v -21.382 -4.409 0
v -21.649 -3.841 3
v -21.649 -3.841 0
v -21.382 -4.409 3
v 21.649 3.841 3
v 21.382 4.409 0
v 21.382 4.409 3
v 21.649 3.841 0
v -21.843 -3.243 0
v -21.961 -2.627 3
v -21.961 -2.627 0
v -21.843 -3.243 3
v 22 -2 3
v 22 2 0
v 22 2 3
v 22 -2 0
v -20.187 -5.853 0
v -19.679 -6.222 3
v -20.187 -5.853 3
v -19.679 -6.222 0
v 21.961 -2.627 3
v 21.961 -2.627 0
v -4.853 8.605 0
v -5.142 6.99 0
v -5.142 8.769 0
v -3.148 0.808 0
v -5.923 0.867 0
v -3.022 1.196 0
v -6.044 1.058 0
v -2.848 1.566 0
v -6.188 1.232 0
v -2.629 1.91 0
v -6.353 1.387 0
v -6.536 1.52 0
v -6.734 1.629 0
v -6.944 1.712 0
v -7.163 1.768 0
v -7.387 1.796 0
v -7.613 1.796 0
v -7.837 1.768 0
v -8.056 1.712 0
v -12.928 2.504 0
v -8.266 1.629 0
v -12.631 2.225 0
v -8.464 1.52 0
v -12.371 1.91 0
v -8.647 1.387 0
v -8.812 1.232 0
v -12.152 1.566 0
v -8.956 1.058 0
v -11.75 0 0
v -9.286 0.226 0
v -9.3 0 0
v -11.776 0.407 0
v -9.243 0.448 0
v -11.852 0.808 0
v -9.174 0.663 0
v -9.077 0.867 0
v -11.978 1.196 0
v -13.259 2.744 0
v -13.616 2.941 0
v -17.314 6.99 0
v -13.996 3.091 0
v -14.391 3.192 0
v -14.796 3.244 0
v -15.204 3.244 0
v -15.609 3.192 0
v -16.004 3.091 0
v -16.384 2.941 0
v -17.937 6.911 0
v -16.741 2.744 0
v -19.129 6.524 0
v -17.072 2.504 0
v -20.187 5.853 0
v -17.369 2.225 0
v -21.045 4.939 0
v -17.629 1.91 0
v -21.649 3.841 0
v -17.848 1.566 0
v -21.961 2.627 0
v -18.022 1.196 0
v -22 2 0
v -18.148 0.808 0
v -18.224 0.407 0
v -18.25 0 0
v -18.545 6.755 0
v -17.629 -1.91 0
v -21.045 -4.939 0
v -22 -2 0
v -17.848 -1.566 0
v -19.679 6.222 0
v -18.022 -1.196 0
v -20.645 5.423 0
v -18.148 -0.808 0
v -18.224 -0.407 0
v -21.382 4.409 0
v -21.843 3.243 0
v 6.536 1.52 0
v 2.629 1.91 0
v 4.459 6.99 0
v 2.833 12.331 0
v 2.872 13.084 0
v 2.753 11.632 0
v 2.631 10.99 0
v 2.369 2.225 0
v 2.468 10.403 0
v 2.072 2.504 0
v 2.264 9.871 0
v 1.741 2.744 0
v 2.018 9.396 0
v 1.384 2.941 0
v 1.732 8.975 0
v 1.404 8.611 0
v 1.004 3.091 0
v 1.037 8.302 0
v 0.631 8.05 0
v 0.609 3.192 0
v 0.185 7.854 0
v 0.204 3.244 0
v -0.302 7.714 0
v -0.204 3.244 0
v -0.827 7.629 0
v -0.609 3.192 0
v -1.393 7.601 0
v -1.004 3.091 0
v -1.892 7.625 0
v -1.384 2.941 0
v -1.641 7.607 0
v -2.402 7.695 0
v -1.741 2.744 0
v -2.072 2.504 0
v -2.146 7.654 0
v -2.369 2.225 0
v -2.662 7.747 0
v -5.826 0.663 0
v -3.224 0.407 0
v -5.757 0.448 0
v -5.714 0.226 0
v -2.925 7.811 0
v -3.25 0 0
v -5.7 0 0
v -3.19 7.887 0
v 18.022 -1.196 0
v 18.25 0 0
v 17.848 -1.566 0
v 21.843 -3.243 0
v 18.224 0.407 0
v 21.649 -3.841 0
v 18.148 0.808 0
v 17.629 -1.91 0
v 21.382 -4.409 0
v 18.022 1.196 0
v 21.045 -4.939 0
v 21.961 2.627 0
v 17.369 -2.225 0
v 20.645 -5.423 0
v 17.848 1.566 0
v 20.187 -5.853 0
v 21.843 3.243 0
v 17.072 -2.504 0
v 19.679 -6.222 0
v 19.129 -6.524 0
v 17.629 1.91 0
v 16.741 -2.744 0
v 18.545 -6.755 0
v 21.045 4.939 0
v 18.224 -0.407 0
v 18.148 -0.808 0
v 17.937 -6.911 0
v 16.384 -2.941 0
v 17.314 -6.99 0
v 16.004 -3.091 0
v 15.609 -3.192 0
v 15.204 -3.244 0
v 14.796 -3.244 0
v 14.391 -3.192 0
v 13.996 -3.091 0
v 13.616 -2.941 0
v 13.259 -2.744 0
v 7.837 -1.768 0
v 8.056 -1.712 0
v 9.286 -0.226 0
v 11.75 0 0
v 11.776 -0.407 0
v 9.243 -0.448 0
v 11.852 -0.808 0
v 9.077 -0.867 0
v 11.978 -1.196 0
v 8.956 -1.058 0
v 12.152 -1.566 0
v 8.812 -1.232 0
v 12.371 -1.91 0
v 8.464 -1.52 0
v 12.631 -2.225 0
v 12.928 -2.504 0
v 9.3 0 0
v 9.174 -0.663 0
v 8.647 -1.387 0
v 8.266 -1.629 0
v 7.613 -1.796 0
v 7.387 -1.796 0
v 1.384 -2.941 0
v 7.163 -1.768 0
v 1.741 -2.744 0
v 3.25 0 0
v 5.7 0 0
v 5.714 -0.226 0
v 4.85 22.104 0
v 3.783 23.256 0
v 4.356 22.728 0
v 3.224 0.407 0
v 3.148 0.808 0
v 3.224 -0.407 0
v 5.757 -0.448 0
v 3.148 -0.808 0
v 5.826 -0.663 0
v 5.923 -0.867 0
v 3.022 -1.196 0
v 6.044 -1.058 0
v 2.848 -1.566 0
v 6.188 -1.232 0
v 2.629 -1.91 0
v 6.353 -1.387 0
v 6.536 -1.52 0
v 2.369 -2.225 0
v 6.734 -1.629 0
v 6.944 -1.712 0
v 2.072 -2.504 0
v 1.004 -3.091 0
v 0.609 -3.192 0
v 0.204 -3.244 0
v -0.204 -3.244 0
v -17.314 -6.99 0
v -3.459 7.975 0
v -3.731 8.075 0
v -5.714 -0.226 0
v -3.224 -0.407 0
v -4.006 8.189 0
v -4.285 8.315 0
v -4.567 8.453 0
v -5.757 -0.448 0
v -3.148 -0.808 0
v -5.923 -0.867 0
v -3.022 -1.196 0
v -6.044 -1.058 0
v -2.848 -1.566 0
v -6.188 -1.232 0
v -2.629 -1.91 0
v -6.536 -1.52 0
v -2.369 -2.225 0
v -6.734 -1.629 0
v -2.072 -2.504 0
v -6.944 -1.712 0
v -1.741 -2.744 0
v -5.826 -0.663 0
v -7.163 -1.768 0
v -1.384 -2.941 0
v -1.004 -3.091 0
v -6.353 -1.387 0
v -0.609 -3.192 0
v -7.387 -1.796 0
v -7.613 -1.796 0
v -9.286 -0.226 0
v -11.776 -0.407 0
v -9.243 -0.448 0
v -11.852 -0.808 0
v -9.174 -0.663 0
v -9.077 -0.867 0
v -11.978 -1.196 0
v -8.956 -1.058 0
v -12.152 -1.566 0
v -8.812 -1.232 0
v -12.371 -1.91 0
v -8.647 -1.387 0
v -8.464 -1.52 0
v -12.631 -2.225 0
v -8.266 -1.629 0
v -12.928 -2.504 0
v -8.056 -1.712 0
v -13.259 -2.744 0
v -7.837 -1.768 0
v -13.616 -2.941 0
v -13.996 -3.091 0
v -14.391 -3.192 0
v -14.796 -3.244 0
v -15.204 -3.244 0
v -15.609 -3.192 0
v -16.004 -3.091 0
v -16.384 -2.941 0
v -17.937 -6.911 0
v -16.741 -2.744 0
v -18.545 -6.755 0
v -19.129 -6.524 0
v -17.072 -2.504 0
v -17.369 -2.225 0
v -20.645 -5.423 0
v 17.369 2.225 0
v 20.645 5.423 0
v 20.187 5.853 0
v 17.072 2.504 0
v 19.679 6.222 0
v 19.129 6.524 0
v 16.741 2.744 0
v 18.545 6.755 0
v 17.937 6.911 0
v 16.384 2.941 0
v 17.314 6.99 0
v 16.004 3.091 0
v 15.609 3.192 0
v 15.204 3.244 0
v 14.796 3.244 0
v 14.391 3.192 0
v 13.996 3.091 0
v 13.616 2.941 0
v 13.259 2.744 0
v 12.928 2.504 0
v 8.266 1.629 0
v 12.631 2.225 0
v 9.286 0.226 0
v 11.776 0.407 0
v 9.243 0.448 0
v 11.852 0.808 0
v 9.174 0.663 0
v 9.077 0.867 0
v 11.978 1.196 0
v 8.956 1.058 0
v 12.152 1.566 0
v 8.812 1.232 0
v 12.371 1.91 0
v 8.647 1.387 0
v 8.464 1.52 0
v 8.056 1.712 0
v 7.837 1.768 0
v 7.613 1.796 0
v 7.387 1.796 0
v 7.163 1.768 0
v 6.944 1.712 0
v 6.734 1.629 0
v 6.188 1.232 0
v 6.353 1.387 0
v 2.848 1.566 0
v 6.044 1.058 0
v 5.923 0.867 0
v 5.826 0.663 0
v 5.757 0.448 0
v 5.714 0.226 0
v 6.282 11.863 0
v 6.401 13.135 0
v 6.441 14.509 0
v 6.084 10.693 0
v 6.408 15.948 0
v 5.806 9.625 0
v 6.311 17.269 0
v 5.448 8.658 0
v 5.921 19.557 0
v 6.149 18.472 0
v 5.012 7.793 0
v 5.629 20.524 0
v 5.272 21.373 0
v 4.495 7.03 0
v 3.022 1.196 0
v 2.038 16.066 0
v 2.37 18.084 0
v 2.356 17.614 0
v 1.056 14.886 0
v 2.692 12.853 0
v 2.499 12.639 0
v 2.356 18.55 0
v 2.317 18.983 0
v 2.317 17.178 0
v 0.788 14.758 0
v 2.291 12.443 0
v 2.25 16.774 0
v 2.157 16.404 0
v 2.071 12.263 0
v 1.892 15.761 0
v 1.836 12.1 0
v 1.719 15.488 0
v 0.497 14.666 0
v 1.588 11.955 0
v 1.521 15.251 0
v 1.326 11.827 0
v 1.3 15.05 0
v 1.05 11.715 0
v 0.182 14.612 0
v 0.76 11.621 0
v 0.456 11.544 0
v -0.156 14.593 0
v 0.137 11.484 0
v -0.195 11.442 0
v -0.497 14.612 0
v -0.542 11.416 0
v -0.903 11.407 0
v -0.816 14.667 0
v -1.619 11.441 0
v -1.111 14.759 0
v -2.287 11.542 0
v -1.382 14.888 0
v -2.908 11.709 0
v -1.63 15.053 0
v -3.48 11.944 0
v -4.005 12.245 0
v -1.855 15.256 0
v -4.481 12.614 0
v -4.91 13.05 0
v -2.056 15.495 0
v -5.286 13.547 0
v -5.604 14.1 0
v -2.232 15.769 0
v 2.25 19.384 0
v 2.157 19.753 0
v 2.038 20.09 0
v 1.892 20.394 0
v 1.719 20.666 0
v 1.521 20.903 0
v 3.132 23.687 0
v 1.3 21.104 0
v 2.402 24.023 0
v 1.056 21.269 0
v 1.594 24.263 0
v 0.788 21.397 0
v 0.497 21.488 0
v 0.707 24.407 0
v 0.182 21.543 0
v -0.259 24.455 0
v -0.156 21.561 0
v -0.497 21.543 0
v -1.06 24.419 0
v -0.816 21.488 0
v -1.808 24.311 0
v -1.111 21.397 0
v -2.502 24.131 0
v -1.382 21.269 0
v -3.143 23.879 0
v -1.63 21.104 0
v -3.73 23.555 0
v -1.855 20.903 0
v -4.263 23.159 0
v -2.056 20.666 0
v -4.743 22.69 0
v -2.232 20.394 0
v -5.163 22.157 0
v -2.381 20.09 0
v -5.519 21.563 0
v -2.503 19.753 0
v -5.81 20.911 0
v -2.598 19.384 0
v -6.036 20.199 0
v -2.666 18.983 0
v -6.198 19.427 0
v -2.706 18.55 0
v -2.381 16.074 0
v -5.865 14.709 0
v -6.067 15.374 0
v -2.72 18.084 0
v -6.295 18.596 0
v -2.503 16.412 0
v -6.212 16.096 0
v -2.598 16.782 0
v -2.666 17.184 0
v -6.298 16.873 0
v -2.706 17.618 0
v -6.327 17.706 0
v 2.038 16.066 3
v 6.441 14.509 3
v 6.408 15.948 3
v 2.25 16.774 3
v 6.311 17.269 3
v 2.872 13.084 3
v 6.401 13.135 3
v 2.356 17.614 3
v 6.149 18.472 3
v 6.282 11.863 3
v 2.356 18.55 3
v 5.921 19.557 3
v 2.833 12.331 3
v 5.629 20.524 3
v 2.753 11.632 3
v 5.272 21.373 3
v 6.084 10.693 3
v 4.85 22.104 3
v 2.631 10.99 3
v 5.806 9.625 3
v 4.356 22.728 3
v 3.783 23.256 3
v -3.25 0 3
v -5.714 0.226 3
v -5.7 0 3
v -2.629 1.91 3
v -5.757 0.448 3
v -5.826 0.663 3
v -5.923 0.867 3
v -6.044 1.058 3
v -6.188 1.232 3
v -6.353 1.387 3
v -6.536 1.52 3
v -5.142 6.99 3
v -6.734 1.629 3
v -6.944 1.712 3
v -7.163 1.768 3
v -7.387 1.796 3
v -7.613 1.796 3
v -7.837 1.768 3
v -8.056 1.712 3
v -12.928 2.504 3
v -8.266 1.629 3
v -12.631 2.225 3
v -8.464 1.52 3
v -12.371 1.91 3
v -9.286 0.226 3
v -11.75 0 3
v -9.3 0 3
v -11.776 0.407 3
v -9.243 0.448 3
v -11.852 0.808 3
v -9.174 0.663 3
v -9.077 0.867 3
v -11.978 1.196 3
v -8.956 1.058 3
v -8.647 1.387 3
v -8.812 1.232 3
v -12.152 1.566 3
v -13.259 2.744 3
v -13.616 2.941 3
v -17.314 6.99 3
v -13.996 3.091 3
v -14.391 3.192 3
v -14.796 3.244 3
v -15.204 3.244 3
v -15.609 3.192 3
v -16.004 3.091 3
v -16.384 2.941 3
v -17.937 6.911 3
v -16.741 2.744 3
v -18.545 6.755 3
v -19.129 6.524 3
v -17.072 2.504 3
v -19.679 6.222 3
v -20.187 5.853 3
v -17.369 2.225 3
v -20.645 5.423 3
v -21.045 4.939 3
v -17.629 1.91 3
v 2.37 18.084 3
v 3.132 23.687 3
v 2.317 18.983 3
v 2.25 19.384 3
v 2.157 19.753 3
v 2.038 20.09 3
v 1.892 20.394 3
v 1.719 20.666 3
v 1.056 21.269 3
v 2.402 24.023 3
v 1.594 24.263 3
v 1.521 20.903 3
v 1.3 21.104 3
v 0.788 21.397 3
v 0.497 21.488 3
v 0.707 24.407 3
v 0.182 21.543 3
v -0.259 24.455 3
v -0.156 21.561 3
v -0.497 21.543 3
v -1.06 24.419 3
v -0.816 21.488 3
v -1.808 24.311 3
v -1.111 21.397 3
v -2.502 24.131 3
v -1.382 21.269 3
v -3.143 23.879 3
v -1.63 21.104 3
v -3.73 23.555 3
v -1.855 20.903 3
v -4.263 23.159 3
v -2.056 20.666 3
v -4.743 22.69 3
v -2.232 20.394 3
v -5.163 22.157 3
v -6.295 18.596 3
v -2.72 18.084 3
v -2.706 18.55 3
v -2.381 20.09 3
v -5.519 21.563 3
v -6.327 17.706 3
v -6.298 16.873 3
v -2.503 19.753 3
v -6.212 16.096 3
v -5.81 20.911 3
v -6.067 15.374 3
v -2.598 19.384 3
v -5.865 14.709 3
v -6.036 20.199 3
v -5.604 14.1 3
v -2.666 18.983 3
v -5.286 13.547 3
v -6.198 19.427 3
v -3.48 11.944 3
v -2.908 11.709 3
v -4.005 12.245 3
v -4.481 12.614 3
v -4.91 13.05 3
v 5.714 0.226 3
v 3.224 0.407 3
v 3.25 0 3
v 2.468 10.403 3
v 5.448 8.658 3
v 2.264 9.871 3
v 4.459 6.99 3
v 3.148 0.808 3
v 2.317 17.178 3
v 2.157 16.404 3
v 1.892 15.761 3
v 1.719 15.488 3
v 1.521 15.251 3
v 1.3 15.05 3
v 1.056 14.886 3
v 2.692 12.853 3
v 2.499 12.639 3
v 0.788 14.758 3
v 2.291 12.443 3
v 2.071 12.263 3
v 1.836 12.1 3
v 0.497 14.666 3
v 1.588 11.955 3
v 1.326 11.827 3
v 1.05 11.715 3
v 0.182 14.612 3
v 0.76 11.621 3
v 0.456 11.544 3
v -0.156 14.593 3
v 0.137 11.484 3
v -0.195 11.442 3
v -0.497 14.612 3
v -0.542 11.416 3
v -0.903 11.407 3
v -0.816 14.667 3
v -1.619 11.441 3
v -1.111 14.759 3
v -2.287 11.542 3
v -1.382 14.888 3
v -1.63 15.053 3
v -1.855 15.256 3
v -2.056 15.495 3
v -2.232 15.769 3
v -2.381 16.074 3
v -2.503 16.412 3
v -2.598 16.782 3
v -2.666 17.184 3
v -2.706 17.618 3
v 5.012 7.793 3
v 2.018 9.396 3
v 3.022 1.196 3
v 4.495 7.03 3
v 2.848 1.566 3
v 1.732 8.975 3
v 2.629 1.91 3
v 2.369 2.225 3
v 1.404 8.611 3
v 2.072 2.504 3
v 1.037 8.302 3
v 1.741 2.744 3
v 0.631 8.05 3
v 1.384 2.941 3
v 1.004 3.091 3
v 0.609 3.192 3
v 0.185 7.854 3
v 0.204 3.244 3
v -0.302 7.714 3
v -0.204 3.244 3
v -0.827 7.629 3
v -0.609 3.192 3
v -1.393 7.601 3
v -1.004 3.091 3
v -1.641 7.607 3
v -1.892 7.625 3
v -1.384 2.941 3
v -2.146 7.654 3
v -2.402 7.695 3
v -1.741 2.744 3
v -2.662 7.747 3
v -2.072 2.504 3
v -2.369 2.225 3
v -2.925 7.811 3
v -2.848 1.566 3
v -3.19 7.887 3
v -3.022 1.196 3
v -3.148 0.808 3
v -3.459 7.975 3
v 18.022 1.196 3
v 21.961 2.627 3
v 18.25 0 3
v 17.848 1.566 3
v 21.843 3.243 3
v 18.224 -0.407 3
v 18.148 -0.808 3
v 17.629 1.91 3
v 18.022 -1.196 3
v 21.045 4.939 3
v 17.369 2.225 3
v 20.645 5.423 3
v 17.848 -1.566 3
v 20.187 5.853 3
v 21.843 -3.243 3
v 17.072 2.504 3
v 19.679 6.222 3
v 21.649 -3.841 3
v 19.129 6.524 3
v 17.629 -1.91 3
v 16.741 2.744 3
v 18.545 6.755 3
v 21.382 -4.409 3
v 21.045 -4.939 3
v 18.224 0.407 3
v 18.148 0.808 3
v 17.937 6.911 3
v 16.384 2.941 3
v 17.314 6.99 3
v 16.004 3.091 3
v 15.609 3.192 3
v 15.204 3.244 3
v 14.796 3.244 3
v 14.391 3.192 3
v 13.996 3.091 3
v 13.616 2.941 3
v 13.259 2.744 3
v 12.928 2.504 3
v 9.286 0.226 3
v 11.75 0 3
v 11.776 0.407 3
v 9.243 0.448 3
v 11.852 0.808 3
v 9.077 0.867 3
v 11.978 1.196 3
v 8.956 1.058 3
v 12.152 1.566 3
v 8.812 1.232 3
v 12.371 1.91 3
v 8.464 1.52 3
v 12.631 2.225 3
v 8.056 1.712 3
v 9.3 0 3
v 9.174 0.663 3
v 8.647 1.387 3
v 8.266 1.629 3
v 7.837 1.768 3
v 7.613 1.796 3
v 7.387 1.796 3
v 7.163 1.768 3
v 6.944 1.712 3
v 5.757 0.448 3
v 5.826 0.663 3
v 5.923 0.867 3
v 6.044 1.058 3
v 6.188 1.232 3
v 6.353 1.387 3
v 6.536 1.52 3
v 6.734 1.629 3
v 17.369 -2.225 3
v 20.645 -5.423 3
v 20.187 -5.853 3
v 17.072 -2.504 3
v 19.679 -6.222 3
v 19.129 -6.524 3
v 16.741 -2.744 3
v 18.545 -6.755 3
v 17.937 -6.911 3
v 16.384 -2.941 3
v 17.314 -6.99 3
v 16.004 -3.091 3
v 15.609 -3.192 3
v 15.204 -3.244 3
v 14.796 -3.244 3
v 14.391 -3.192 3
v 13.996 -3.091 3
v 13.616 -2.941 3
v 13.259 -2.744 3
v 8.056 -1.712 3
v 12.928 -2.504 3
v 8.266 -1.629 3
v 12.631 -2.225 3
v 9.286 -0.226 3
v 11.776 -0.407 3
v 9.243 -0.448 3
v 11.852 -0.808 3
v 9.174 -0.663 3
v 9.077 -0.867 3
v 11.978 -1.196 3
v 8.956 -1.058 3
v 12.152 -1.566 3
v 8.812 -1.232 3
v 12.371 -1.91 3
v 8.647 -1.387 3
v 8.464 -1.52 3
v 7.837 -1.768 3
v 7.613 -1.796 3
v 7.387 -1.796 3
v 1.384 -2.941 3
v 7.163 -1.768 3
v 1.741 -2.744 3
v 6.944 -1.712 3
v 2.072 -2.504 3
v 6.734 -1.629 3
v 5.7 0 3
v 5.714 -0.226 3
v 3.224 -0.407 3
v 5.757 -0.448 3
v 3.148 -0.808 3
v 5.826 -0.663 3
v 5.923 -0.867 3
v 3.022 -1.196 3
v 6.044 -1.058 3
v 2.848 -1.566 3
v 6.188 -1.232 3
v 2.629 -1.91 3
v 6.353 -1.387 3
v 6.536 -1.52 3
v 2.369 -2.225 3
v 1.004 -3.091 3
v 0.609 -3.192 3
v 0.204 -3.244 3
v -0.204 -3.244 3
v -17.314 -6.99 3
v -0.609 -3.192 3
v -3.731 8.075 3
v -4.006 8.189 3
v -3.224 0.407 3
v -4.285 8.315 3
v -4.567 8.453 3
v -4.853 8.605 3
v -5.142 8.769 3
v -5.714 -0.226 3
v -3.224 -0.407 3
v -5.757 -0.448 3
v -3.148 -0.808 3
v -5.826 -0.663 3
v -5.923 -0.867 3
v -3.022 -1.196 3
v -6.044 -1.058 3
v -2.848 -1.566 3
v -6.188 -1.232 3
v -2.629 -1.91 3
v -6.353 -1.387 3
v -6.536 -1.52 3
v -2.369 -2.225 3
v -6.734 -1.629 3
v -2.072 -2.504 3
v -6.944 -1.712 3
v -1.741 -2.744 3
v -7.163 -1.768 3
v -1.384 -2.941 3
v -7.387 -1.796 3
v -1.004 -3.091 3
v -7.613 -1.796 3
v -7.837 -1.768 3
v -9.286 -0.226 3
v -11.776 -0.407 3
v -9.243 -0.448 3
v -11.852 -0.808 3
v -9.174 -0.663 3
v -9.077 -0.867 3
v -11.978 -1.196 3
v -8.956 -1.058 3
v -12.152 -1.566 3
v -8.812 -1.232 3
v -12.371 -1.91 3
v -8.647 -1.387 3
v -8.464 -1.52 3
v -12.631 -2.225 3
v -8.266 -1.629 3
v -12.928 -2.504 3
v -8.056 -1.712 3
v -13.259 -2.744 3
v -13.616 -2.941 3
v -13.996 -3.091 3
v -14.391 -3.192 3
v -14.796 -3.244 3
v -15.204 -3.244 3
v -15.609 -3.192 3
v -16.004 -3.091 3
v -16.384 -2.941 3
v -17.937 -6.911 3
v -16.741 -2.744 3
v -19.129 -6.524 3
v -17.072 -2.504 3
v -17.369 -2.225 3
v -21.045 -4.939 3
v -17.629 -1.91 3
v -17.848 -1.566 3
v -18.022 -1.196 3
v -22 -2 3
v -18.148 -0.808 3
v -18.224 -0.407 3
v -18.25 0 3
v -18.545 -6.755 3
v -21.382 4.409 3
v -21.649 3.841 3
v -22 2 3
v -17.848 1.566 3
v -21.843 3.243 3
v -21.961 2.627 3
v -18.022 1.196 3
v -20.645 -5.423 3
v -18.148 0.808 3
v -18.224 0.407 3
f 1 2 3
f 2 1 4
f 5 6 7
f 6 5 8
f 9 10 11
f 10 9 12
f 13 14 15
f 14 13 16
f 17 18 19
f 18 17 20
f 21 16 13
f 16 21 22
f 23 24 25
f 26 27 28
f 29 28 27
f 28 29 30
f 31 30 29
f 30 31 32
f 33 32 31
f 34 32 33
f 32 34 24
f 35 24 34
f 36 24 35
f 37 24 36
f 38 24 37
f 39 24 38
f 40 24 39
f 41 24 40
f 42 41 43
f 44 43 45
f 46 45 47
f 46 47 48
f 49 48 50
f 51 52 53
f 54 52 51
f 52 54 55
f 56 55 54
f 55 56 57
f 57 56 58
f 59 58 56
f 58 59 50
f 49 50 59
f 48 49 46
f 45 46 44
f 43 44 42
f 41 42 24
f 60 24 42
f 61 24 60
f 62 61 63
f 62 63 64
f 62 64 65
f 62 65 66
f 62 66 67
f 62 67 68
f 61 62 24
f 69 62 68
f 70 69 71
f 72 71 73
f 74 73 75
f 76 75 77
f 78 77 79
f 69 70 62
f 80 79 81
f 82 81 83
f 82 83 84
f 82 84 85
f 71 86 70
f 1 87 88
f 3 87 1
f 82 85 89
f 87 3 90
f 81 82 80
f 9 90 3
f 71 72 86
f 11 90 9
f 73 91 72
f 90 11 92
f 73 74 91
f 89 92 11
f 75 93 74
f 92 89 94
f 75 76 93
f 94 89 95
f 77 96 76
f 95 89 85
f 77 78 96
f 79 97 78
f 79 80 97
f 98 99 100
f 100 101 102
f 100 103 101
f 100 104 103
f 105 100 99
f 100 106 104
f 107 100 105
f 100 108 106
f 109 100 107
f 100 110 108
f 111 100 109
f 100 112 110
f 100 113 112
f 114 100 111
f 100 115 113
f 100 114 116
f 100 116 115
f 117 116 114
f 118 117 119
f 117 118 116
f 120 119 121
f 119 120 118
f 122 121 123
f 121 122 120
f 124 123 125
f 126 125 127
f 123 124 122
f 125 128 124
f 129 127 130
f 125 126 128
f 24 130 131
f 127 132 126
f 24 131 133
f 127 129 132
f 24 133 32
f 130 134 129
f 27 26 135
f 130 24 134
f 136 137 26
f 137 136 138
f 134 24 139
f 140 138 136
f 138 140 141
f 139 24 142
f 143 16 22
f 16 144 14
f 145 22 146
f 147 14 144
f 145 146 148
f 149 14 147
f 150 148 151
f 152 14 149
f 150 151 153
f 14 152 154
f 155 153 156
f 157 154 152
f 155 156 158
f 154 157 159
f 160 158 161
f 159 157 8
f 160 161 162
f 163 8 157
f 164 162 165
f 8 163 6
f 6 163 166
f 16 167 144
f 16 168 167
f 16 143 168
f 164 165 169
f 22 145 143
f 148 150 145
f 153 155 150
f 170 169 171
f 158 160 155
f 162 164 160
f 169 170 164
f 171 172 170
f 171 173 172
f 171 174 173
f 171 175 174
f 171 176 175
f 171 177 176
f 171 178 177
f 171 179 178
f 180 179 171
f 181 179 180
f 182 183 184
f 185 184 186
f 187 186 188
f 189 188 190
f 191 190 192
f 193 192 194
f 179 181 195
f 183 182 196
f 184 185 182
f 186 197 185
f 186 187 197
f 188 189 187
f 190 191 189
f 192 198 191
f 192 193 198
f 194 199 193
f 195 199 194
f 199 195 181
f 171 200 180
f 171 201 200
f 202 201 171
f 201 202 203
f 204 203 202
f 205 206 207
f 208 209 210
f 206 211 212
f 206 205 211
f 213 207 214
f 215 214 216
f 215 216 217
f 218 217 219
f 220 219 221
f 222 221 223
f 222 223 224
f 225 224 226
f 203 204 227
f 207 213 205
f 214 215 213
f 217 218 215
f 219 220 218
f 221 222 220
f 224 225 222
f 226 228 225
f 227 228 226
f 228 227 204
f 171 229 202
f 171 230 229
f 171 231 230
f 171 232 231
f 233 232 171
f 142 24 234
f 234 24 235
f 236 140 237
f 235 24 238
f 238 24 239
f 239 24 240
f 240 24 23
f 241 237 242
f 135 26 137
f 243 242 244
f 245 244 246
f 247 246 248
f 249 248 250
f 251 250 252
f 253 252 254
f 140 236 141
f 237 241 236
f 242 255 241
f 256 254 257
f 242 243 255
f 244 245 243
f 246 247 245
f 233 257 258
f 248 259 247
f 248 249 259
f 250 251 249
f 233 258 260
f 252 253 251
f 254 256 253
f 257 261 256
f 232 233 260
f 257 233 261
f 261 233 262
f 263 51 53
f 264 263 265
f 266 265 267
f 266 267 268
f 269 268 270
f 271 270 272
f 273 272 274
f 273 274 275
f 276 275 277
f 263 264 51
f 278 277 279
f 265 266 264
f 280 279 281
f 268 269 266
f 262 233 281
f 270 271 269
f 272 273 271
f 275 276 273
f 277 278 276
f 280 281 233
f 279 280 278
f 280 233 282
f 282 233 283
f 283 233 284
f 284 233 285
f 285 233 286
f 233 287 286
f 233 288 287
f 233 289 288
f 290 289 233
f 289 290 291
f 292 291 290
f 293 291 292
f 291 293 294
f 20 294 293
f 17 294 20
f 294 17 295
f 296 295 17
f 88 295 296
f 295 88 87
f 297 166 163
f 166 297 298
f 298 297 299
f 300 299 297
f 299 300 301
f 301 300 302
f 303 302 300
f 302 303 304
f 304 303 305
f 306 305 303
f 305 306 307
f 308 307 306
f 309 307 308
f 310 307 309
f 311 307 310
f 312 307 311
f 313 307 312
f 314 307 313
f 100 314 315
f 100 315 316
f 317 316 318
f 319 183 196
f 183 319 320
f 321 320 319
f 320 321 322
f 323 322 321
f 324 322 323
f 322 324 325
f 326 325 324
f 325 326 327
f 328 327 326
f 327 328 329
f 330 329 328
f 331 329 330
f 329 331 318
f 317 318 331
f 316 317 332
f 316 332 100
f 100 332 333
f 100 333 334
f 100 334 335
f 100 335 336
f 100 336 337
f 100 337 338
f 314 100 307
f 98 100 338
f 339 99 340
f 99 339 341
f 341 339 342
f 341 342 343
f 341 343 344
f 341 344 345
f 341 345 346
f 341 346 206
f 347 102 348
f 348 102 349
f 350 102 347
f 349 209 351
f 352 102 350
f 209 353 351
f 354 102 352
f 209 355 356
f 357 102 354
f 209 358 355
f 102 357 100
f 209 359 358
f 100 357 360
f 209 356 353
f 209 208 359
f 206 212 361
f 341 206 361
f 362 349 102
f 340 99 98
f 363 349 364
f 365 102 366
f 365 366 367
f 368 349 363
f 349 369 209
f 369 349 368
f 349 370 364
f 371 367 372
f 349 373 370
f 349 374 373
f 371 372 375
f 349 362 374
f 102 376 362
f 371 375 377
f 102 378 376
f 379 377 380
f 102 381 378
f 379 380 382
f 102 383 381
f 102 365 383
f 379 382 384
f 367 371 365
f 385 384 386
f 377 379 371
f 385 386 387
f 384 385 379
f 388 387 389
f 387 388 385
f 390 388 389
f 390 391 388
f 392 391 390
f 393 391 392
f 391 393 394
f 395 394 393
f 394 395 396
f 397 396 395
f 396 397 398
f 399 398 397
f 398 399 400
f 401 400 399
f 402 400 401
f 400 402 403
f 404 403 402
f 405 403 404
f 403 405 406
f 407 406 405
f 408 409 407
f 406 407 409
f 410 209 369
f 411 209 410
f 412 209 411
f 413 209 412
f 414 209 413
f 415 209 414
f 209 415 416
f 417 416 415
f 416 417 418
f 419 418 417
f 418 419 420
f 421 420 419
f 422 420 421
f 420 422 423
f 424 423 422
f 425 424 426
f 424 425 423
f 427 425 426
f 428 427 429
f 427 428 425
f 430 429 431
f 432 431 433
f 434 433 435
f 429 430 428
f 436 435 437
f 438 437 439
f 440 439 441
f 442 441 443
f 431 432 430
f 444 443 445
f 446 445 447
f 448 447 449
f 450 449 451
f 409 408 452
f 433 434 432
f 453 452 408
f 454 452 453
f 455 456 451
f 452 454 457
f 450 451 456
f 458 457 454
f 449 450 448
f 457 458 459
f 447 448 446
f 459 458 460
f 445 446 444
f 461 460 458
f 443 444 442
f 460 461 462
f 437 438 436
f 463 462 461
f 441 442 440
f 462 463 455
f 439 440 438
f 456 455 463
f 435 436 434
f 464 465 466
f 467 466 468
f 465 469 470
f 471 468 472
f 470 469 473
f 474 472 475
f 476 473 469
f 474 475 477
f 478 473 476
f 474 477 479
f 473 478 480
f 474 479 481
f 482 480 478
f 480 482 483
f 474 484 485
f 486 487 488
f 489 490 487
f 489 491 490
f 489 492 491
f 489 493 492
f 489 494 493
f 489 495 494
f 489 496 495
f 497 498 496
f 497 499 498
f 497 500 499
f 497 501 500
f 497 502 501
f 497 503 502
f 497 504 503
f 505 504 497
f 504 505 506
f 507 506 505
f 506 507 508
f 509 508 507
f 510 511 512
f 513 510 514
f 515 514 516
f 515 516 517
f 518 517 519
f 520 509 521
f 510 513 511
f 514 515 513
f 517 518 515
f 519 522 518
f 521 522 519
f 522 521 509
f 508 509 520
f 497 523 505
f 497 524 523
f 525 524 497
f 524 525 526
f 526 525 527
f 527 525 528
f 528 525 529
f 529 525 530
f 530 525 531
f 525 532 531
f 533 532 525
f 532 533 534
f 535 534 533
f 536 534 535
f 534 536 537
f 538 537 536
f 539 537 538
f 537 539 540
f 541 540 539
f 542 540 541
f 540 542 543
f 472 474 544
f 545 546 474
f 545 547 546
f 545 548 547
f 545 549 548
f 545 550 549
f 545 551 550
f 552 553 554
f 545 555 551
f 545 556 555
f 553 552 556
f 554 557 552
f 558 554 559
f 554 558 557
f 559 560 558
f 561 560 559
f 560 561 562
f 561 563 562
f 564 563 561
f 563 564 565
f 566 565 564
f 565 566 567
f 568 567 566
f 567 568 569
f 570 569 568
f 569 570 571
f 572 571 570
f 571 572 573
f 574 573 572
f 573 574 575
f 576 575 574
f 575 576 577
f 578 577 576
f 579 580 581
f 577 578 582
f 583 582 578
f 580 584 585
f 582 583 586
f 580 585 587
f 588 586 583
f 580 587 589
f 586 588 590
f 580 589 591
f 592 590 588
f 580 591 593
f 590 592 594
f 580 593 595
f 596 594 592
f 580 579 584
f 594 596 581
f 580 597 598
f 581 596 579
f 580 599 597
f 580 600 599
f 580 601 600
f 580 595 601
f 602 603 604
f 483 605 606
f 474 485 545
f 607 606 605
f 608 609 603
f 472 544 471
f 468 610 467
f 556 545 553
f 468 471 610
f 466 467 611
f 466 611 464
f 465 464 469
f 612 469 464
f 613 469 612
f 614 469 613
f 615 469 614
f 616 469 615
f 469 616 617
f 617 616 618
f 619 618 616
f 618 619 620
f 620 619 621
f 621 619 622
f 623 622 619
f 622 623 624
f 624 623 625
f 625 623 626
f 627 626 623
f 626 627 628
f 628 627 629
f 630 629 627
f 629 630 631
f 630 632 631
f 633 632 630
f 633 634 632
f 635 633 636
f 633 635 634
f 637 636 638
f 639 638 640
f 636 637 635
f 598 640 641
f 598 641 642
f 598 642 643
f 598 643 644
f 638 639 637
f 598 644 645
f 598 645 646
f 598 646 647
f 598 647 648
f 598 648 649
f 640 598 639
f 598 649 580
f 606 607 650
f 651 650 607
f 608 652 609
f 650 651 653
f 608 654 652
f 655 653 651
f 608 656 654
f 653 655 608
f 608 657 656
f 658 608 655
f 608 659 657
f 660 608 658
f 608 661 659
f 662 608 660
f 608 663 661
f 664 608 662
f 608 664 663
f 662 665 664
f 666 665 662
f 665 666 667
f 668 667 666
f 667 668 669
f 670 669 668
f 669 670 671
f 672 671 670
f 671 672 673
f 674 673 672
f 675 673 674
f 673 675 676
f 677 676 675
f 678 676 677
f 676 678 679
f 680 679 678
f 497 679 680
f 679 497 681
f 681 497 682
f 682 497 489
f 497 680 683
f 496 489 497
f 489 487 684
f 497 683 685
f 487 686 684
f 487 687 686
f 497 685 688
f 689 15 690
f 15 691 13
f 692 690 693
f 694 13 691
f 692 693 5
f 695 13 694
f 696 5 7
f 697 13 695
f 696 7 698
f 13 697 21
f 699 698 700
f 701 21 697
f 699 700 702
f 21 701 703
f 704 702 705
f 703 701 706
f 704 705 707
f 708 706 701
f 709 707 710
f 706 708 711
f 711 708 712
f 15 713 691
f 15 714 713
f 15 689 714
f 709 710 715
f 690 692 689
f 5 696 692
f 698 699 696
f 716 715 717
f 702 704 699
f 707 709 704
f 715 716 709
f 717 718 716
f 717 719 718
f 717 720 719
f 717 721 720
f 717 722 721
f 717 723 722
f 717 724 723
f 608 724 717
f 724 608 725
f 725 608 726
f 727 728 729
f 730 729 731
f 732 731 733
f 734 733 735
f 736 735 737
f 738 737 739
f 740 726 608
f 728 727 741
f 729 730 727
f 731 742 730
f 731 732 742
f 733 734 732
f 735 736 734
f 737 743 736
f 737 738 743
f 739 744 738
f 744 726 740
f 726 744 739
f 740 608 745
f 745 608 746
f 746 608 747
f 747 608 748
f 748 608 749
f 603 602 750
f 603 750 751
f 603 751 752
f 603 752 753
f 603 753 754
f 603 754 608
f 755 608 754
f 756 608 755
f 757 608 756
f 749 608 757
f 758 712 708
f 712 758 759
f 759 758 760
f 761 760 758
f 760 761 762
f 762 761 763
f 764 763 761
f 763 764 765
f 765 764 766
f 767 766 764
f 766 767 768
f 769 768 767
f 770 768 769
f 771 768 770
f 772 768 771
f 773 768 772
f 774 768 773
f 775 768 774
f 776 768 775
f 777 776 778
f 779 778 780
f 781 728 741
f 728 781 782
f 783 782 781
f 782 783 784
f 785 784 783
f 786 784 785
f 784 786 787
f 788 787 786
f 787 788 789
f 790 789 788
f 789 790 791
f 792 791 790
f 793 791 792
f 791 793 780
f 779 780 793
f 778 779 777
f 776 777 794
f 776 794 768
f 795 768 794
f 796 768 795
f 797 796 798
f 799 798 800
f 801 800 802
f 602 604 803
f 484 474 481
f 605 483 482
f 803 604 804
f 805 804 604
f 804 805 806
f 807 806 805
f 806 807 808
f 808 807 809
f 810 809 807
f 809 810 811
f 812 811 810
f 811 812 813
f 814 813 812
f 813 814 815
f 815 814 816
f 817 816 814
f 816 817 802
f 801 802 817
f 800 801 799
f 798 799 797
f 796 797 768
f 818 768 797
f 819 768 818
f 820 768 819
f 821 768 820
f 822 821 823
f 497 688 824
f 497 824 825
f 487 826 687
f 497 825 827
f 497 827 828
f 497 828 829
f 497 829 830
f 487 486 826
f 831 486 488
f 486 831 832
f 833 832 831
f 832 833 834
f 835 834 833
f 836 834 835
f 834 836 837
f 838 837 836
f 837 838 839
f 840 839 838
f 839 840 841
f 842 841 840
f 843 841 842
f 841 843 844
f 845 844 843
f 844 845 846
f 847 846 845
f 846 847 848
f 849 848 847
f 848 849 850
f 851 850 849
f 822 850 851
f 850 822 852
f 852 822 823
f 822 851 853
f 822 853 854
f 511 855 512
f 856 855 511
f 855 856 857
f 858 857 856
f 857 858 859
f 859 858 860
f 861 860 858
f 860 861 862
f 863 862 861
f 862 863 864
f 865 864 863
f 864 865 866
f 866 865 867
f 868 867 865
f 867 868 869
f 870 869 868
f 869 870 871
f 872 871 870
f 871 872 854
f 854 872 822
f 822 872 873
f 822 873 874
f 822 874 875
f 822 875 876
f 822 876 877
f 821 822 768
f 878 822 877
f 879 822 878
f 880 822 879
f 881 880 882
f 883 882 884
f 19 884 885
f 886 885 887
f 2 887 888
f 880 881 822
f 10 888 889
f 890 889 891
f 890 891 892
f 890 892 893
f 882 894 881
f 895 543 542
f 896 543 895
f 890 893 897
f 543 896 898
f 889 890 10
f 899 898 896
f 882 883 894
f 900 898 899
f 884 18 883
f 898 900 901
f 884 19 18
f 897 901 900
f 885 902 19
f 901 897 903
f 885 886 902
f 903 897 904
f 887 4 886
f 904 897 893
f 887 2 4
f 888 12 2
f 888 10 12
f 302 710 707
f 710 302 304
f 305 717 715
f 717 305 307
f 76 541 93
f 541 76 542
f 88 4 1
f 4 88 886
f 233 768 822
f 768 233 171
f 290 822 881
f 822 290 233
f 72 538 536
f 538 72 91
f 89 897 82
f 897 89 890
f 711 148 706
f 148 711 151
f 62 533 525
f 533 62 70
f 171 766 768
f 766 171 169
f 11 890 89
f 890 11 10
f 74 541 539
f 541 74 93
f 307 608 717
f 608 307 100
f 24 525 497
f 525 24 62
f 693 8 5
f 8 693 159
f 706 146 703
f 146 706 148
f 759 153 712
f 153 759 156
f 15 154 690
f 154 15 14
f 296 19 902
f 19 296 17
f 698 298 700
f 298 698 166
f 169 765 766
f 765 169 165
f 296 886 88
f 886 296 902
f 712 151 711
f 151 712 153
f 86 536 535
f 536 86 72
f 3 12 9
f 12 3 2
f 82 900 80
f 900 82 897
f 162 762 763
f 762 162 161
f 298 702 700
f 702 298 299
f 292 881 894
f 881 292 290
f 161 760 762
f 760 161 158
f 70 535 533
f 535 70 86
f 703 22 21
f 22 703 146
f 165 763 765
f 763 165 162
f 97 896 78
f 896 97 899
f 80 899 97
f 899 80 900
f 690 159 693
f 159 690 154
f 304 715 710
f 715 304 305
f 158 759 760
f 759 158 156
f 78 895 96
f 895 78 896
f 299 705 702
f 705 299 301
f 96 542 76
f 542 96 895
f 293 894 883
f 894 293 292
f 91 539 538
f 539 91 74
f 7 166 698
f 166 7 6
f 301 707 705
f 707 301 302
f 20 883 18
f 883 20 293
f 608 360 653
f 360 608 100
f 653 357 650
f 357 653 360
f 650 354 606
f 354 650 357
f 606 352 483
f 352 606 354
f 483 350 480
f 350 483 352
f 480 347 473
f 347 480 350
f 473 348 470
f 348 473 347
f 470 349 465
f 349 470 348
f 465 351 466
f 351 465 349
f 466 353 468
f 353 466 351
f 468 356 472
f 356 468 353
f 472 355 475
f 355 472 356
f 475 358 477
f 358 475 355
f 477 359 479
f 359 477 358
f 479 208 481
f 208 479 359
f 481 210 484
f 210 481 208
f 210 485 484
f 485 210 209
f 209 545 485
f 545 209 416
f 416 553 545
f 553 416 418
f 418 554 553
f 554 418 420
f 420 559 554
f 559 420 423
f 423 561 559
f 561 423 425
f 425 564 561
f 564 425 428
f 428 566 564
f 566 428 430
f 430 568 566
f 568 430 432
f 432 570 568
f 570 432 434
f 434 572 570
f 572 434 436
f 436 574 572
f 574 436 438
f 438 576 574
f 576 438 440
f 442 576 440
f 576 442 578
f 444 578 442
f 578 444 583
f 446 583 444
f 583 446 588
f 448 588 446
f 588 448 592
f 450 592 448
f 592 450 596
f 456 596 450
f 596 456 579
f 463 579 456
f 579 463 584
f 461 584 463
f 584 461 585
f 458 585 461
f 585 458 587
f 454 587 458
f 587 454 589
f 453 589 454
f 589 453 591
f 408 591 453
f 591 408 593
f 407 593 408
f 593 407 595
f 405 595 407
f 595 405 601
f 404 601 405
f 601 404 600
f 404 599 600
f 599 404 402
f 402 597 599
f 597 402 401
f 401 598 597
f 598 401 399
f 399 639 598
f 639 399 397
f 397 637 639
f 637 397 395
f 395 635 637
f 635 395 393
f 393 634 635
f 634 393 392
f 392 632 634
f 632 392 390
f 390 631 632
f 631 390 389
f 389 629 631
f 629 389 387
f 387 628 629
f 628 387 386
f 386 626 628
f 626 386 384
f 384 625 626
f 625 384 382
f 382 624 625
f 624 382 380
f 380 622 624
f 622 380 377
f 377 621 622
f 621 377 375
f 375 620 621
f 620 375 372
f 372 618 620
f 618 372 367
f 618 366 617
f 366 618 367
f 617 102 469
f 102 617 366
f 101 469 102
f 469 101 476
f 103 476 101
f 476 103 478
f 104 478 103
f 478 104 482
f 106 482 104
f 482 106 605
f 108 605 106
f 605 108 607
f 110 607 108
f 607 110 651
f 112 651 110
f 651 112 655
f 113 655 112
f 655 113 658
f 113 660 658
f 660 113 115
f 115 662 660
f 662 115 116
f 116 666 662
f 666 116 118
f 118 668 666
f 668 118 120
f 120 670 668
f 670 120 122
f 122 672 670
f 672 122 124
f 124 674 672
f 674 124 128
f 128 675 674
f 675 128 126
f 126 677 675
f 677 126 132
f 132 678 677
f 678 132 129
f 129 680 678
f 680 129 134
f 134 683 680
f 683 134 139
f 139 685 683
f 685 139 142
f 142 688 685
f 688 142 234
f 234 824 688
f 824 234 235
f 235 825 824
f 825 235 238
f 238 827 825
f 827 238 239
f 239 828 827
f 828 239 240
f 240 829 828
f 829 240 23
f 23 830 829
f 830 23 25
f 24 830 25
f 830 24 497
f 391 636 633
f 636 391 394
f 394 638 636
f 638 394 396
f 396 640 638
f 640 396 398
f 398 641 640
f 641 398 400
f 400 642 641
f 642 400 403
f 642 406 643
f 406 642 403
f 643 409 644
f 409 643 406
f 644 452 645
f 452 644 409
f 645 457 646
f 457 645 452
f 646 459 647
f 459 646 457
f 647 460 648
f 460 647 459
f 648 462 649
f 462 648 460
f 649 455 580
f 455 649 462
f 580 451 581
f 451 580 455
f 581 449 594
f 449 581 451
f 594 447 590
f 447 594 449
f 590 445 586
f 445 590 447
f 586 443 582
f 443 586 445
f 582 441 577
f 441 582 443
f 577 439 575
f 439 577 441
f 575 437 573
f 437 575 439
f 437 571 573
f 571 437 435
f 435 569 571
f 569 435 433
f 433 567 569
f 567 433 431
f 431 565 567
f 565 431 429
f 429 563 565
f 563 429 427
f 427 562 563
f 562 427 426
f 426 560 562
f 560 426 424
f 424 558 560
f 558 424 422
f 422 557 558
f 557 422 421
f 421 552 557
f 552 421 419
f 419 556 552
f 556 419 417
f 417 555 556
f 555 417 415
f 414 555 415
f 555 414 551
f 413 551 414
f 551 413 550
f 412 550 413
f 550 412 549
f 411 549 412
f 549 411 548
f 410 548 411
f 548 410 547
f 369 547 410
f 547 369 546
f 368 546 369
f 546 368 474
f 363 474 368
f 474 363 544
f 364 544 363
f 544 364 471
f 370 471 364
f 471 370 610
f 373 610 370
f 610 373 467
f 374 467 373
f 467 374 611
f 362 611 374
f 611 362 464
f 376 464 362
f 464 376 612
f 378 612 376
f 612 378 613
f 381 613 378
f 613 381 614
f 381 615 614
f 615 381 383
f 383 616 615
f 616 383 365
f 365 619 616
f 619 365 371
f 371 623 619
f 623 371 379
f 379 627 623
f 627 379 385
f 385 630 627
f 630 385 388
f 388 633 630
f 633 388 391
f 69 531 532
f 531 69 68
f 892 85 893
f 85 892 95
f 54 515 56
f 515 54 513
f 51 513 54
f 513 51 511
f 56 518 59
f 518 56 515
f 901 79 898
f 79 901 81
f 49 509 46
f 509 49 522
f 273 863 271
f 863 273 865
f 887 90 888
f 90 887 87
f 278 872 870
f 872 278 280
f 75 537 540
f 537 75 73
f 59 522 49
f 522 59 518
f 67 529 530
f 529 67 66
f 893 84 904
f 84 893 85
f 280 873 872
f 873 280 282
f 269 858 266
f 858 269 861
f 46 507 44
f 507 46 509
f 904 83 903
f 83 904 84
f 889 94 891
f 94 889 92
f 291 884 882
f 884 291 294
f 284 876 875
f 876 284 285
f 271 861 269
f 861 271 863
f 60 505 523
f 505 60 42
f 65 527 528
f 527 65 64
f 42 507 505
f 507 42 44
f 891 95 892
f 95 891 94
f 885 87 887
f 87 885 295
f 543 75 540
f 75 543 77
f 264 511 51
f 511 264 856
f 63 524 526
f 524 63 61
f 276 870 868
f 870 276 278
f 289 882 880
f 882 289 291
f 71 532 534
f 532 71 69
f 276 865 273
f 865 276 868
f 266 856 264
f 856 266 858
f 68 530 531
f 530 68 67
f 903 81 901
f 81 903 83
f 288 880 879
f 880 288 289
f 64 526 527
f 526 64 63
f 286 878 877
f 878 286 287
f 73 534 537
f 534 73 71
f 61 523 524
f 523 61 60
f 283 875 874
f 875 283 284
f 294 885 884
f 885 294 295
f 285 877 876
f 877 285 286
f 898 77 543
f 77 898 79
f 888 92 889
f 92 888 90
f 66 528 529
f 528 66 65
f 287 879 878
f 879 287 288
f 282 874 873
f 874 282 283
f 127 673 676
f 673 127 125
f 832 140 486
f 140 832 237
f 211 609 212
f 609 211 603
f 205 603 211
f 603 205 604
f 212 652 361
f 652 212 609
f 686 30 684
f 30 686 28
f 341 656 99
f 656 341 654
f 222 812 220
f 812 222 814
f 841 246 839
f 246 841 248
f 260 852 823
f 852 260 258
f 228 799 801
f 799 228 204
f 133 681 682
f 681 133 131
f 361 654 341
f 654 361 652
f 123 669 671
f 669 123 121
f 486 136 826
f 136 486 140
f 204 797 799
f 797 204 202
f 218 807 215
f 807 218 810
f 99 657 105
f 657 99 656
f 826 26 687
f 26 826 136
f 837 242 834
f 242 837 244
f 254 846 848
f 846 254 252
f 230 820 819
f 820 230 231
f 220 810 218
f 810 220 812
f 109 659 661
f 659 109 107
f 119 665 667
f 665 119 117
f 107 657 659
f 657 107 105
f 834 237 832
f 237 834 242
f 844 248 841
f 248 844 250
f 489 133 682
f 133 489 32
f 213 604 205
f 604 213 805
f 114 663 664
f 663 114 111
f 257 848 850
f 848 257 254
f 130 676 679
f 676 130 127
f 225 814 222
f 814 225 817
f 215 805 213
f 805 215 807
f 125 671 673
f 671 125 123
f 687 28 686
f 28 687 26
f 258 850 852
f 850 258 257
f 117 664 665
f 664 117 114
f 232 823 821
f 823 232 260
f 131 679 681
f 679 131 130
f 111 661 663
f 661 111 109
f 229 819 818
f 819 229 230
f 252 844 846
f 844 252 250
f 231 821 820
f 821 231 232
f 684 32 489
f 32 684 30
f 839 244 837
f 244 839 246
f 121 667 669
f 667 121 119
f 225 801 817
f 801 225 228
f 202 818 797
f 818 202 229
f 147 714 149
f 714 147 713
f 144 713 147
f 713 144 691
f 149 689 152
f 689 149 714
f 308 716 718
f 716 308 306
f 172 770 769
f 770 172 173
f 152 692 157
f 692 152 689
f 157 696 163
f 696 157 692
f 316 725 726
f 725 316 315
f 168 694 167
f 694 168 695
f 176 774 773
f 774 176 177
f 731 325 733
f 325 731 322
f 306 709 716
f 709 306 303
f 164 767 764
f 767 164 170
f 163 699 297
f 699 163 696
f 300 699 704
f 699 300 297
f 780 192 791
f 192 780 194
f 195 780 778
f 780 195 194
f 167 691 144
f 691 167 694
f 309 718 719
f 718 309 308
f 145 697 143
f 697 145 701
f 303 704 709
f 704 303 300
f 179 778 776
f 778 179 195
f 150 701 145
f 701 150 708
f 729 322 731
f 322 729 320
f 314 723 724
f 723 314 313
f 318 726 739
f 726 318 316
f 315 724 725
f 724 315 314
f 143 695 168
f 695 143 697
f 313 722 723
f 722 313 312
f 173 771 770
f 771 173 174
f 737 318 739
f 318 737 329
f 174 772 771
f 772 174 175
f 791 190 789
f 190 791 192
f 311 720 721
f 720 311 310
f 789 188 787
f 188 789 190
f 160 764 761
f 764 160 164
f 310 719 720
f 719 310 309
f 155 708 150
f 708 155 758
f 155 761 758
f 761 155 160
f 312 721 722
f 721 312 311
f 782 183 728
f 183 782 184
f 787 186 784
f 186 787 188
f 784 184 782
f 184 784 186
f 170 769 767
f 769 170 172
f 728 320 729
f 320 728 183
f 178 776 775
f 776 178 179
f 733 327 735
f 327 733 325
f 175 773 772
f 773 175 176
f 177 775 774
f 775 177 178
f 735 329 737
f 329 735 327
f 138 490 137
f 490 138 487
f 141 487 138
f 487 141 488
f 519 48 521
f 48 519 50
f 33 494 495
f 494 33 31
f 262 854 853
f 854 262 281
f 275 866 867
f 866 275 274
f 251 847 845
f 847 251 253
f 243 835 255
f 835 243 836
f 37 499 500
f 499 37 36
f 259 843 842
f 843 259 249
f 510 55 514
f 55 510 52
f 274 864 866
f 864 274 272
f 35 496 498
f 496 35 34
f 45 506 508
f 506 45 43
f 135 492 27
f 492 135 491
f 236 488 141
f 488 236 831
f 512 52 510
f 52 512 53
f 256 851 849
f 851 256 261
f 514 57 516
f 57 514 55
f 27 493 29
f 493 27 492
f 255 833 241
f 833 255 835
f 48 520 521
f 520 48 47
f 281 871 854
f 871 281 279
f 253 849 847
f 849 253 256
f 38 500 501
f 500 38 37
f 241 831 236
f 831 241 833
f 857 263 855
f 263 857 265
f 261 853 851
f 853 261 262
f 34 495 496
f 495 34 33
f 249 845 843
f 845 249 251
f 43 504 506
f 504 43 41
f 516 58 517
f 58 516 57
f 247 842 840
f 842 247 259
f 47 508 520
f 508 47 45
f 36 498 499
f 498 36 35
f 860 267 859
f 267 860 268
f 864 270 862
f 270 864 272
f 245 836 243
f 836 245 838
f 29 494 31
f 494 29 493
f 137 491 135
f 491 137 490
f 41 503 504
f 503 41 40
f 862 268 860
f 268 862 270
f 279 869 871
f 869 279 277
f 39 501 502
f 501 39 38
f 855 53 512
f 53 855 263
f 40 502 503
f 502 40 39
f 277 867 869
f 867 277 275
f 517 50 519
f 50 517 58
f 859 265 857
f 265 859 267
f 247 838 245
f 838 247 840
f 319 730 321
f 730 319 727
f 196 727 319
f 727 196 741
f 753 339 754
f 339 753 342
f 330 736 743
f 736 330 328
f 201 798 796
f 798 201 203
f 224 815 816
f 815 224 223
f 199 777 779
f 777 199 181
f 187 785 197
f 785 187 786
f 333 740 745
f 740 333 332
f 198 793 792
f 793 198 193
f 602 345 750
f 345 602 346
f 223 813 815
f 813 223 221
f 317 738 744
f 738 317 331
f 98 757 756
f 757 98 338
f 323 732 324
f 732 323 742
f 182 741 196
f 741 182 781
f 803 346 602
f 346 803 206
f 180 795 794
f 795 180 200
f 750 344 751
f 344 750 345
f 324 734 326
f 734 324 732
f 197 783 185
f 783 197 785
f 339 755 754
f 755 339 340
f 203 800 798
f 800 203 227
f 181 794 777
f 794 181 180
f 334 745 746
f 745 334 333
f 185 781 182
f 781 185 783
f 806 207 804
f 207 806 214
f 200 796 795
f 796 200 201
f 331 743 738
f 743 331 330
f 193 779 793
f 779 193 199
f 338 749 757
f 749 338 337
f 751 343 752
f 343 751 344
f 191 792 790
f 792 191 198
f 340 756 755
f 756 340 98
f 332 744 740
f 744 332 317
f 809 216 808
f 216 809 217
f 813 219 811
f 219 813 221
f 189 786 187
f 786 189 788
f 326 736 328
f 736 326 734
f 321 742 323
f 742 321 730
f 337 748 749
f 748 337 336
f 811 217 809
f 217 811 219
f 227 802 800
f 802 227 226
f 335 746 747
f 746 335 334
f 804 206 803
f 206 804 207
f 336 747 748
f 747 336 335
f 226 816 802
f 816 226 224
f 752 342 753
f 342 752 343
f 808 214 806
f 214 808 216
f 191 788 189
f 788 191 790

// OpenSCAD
$fn = 50;


difference() {
	union() {
		hull() {
			translate(v = [-17.0000000000, 2.0000000000, 0]) {
				cylinder(h = 3, r = 5);
			}
			translate(v = [17.0000000000, 2.0000000000, 0]) {
				cylinder(h = 3, r = 5);
			}
			translate(v = [-17.0000000000, -2.0000000000, 0]) {
				cylinder(h = 3, r = 5);
			}
			translate(v = [17.0000000000, -2.0000000000, 0]) {
				cylinder(h = 3, r = 5);
			}
		}
		translate(v = [0, 24, 0]) {
			linear_extrude(height = 3) {
				text(font = "DejaVu Sans Mono:style=Bold", halign = "center", size = 19.0000000000, text = "9", valign = "top");
			}
		}
	}
	union() {
		translate(v = [-15.0000000000, 0.0000000000, 0]) {
			translate(v = [0, 0, -100]) {
				cylinder(h = 200, r = 3.2500000000);
			}
		}
		translate(v = [0, 0, -100]) {
			cylinder(h = 200, r = 3.2500000000);
		}
		translate(v = [15.0000000000, 0.0000000000, 0]) {
			translate(v = [0, 0, -100]) {
				cylinder(h = 200, r = 3.2500000000);
			}
		}
		translate(v = [-15.0000000000, 0.0000000000, 0]) {
			translate(v = [0, 0, -100]) {
				cylinder(h = 200, r = 1.8000000000);
			}
		}
		translate(v = [-7.5000000000, 0.0000000000, 0]) {
			translate(v = [0, 0, -100]) {
				cylinder(h = 200, r = 1.8000000000);
			}
		}
		translate(v = [0, 0, -100]) {
			cylinder(h = 200, r = 1.8000000000);
		}
		translate(v = [7.5000000000, 0.0000000000, 0]) {
			translate(v = [0, 0, -100]) {
				cylinder(h = 200, r = 1.8000000000);
			}
		}
		translate(v = [15.0000000000, 0.0000000000, 0]) {
			translate(v = [0, 0, -100]) {
				cylinder(h = 200, r = 1.8000000000);
			}
		}
	}
}
